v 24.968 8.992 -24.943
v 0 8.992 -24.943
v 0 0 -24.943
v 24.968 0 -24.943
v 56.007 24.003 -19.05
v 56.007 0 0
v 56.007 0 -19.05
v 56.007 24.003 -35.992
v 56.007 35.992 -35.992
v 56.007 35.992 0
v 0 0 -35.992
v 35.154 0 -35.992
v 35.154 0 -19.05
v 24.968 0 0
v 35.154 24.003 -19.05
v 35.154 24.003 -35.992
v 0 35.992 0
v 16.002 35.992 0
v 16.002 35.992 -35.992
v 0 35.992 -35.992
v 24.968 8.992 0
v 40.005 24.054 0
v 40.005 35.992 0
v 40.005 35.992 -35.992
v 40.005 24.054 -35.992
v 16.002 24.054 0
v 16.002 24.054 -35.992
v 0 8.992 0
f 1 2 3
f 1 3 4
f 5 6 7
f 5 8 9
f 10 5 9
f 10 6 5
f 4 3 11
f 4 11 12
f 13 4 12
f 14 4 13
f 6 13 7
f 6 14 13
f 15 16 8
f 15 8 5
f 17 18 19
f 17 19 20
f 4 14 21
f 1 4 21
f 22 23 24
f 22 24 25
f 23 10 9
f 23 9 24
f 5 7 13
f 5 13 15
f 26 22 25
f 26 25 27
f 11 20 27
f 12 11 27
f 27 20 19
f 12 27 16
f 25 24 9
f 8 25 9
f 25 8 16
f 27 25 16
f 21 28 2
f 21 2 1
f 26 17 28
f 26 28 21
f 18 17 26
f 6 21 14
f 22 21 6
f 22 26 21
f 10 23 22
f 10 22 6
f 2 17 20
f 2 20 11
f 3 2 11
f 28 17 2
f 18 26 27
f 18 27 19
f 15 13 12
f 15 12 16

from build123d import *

# Parameters (mm, degrees)
F1_DEPTH = 35.9918
F2_W     = 24.003
F2_H     = 16.9418
F3_DEPTH = 20.8534
F4_W     = 24.9682
F4_H     = 8.9916
F5_DEPTH = 24.9428


with BuildPart() as f1:
    # F0 (on Top) → F1 (new body)
    with BuildSketch(Plane.XY):
        Polygon((0, 35.9918), (0, 0), (56.007, 0), (56.007, 35.9918), (40.004998, 35.9918), (40.004998, 24.053801), (16.001999, 24.053801), (16.001999, 35.9918), align=None)
    extrude(amount=-F1_DEPTH)

    # F2 (on face) → F3 (cut)
    with BuildSketch(Plane.YZ.offset(56.007)):
        with Locations((12.0015, -27.5209)):
            Rectangle(F2_W, F2_H)
    extrude(amount=-F3_DEPTH, mode=Mode.SUBTRACT)

    # F4 (on face) → F5 (cut)
    with BuildSketch(Plane.XY):
        with Locations((12.4841, 4.4958)):
            Rectangle(F4_W, F4_H)
    extrude(amount=-F5_DEPTH, mode=Mode.SUBTRACT)


solid = f1.part
